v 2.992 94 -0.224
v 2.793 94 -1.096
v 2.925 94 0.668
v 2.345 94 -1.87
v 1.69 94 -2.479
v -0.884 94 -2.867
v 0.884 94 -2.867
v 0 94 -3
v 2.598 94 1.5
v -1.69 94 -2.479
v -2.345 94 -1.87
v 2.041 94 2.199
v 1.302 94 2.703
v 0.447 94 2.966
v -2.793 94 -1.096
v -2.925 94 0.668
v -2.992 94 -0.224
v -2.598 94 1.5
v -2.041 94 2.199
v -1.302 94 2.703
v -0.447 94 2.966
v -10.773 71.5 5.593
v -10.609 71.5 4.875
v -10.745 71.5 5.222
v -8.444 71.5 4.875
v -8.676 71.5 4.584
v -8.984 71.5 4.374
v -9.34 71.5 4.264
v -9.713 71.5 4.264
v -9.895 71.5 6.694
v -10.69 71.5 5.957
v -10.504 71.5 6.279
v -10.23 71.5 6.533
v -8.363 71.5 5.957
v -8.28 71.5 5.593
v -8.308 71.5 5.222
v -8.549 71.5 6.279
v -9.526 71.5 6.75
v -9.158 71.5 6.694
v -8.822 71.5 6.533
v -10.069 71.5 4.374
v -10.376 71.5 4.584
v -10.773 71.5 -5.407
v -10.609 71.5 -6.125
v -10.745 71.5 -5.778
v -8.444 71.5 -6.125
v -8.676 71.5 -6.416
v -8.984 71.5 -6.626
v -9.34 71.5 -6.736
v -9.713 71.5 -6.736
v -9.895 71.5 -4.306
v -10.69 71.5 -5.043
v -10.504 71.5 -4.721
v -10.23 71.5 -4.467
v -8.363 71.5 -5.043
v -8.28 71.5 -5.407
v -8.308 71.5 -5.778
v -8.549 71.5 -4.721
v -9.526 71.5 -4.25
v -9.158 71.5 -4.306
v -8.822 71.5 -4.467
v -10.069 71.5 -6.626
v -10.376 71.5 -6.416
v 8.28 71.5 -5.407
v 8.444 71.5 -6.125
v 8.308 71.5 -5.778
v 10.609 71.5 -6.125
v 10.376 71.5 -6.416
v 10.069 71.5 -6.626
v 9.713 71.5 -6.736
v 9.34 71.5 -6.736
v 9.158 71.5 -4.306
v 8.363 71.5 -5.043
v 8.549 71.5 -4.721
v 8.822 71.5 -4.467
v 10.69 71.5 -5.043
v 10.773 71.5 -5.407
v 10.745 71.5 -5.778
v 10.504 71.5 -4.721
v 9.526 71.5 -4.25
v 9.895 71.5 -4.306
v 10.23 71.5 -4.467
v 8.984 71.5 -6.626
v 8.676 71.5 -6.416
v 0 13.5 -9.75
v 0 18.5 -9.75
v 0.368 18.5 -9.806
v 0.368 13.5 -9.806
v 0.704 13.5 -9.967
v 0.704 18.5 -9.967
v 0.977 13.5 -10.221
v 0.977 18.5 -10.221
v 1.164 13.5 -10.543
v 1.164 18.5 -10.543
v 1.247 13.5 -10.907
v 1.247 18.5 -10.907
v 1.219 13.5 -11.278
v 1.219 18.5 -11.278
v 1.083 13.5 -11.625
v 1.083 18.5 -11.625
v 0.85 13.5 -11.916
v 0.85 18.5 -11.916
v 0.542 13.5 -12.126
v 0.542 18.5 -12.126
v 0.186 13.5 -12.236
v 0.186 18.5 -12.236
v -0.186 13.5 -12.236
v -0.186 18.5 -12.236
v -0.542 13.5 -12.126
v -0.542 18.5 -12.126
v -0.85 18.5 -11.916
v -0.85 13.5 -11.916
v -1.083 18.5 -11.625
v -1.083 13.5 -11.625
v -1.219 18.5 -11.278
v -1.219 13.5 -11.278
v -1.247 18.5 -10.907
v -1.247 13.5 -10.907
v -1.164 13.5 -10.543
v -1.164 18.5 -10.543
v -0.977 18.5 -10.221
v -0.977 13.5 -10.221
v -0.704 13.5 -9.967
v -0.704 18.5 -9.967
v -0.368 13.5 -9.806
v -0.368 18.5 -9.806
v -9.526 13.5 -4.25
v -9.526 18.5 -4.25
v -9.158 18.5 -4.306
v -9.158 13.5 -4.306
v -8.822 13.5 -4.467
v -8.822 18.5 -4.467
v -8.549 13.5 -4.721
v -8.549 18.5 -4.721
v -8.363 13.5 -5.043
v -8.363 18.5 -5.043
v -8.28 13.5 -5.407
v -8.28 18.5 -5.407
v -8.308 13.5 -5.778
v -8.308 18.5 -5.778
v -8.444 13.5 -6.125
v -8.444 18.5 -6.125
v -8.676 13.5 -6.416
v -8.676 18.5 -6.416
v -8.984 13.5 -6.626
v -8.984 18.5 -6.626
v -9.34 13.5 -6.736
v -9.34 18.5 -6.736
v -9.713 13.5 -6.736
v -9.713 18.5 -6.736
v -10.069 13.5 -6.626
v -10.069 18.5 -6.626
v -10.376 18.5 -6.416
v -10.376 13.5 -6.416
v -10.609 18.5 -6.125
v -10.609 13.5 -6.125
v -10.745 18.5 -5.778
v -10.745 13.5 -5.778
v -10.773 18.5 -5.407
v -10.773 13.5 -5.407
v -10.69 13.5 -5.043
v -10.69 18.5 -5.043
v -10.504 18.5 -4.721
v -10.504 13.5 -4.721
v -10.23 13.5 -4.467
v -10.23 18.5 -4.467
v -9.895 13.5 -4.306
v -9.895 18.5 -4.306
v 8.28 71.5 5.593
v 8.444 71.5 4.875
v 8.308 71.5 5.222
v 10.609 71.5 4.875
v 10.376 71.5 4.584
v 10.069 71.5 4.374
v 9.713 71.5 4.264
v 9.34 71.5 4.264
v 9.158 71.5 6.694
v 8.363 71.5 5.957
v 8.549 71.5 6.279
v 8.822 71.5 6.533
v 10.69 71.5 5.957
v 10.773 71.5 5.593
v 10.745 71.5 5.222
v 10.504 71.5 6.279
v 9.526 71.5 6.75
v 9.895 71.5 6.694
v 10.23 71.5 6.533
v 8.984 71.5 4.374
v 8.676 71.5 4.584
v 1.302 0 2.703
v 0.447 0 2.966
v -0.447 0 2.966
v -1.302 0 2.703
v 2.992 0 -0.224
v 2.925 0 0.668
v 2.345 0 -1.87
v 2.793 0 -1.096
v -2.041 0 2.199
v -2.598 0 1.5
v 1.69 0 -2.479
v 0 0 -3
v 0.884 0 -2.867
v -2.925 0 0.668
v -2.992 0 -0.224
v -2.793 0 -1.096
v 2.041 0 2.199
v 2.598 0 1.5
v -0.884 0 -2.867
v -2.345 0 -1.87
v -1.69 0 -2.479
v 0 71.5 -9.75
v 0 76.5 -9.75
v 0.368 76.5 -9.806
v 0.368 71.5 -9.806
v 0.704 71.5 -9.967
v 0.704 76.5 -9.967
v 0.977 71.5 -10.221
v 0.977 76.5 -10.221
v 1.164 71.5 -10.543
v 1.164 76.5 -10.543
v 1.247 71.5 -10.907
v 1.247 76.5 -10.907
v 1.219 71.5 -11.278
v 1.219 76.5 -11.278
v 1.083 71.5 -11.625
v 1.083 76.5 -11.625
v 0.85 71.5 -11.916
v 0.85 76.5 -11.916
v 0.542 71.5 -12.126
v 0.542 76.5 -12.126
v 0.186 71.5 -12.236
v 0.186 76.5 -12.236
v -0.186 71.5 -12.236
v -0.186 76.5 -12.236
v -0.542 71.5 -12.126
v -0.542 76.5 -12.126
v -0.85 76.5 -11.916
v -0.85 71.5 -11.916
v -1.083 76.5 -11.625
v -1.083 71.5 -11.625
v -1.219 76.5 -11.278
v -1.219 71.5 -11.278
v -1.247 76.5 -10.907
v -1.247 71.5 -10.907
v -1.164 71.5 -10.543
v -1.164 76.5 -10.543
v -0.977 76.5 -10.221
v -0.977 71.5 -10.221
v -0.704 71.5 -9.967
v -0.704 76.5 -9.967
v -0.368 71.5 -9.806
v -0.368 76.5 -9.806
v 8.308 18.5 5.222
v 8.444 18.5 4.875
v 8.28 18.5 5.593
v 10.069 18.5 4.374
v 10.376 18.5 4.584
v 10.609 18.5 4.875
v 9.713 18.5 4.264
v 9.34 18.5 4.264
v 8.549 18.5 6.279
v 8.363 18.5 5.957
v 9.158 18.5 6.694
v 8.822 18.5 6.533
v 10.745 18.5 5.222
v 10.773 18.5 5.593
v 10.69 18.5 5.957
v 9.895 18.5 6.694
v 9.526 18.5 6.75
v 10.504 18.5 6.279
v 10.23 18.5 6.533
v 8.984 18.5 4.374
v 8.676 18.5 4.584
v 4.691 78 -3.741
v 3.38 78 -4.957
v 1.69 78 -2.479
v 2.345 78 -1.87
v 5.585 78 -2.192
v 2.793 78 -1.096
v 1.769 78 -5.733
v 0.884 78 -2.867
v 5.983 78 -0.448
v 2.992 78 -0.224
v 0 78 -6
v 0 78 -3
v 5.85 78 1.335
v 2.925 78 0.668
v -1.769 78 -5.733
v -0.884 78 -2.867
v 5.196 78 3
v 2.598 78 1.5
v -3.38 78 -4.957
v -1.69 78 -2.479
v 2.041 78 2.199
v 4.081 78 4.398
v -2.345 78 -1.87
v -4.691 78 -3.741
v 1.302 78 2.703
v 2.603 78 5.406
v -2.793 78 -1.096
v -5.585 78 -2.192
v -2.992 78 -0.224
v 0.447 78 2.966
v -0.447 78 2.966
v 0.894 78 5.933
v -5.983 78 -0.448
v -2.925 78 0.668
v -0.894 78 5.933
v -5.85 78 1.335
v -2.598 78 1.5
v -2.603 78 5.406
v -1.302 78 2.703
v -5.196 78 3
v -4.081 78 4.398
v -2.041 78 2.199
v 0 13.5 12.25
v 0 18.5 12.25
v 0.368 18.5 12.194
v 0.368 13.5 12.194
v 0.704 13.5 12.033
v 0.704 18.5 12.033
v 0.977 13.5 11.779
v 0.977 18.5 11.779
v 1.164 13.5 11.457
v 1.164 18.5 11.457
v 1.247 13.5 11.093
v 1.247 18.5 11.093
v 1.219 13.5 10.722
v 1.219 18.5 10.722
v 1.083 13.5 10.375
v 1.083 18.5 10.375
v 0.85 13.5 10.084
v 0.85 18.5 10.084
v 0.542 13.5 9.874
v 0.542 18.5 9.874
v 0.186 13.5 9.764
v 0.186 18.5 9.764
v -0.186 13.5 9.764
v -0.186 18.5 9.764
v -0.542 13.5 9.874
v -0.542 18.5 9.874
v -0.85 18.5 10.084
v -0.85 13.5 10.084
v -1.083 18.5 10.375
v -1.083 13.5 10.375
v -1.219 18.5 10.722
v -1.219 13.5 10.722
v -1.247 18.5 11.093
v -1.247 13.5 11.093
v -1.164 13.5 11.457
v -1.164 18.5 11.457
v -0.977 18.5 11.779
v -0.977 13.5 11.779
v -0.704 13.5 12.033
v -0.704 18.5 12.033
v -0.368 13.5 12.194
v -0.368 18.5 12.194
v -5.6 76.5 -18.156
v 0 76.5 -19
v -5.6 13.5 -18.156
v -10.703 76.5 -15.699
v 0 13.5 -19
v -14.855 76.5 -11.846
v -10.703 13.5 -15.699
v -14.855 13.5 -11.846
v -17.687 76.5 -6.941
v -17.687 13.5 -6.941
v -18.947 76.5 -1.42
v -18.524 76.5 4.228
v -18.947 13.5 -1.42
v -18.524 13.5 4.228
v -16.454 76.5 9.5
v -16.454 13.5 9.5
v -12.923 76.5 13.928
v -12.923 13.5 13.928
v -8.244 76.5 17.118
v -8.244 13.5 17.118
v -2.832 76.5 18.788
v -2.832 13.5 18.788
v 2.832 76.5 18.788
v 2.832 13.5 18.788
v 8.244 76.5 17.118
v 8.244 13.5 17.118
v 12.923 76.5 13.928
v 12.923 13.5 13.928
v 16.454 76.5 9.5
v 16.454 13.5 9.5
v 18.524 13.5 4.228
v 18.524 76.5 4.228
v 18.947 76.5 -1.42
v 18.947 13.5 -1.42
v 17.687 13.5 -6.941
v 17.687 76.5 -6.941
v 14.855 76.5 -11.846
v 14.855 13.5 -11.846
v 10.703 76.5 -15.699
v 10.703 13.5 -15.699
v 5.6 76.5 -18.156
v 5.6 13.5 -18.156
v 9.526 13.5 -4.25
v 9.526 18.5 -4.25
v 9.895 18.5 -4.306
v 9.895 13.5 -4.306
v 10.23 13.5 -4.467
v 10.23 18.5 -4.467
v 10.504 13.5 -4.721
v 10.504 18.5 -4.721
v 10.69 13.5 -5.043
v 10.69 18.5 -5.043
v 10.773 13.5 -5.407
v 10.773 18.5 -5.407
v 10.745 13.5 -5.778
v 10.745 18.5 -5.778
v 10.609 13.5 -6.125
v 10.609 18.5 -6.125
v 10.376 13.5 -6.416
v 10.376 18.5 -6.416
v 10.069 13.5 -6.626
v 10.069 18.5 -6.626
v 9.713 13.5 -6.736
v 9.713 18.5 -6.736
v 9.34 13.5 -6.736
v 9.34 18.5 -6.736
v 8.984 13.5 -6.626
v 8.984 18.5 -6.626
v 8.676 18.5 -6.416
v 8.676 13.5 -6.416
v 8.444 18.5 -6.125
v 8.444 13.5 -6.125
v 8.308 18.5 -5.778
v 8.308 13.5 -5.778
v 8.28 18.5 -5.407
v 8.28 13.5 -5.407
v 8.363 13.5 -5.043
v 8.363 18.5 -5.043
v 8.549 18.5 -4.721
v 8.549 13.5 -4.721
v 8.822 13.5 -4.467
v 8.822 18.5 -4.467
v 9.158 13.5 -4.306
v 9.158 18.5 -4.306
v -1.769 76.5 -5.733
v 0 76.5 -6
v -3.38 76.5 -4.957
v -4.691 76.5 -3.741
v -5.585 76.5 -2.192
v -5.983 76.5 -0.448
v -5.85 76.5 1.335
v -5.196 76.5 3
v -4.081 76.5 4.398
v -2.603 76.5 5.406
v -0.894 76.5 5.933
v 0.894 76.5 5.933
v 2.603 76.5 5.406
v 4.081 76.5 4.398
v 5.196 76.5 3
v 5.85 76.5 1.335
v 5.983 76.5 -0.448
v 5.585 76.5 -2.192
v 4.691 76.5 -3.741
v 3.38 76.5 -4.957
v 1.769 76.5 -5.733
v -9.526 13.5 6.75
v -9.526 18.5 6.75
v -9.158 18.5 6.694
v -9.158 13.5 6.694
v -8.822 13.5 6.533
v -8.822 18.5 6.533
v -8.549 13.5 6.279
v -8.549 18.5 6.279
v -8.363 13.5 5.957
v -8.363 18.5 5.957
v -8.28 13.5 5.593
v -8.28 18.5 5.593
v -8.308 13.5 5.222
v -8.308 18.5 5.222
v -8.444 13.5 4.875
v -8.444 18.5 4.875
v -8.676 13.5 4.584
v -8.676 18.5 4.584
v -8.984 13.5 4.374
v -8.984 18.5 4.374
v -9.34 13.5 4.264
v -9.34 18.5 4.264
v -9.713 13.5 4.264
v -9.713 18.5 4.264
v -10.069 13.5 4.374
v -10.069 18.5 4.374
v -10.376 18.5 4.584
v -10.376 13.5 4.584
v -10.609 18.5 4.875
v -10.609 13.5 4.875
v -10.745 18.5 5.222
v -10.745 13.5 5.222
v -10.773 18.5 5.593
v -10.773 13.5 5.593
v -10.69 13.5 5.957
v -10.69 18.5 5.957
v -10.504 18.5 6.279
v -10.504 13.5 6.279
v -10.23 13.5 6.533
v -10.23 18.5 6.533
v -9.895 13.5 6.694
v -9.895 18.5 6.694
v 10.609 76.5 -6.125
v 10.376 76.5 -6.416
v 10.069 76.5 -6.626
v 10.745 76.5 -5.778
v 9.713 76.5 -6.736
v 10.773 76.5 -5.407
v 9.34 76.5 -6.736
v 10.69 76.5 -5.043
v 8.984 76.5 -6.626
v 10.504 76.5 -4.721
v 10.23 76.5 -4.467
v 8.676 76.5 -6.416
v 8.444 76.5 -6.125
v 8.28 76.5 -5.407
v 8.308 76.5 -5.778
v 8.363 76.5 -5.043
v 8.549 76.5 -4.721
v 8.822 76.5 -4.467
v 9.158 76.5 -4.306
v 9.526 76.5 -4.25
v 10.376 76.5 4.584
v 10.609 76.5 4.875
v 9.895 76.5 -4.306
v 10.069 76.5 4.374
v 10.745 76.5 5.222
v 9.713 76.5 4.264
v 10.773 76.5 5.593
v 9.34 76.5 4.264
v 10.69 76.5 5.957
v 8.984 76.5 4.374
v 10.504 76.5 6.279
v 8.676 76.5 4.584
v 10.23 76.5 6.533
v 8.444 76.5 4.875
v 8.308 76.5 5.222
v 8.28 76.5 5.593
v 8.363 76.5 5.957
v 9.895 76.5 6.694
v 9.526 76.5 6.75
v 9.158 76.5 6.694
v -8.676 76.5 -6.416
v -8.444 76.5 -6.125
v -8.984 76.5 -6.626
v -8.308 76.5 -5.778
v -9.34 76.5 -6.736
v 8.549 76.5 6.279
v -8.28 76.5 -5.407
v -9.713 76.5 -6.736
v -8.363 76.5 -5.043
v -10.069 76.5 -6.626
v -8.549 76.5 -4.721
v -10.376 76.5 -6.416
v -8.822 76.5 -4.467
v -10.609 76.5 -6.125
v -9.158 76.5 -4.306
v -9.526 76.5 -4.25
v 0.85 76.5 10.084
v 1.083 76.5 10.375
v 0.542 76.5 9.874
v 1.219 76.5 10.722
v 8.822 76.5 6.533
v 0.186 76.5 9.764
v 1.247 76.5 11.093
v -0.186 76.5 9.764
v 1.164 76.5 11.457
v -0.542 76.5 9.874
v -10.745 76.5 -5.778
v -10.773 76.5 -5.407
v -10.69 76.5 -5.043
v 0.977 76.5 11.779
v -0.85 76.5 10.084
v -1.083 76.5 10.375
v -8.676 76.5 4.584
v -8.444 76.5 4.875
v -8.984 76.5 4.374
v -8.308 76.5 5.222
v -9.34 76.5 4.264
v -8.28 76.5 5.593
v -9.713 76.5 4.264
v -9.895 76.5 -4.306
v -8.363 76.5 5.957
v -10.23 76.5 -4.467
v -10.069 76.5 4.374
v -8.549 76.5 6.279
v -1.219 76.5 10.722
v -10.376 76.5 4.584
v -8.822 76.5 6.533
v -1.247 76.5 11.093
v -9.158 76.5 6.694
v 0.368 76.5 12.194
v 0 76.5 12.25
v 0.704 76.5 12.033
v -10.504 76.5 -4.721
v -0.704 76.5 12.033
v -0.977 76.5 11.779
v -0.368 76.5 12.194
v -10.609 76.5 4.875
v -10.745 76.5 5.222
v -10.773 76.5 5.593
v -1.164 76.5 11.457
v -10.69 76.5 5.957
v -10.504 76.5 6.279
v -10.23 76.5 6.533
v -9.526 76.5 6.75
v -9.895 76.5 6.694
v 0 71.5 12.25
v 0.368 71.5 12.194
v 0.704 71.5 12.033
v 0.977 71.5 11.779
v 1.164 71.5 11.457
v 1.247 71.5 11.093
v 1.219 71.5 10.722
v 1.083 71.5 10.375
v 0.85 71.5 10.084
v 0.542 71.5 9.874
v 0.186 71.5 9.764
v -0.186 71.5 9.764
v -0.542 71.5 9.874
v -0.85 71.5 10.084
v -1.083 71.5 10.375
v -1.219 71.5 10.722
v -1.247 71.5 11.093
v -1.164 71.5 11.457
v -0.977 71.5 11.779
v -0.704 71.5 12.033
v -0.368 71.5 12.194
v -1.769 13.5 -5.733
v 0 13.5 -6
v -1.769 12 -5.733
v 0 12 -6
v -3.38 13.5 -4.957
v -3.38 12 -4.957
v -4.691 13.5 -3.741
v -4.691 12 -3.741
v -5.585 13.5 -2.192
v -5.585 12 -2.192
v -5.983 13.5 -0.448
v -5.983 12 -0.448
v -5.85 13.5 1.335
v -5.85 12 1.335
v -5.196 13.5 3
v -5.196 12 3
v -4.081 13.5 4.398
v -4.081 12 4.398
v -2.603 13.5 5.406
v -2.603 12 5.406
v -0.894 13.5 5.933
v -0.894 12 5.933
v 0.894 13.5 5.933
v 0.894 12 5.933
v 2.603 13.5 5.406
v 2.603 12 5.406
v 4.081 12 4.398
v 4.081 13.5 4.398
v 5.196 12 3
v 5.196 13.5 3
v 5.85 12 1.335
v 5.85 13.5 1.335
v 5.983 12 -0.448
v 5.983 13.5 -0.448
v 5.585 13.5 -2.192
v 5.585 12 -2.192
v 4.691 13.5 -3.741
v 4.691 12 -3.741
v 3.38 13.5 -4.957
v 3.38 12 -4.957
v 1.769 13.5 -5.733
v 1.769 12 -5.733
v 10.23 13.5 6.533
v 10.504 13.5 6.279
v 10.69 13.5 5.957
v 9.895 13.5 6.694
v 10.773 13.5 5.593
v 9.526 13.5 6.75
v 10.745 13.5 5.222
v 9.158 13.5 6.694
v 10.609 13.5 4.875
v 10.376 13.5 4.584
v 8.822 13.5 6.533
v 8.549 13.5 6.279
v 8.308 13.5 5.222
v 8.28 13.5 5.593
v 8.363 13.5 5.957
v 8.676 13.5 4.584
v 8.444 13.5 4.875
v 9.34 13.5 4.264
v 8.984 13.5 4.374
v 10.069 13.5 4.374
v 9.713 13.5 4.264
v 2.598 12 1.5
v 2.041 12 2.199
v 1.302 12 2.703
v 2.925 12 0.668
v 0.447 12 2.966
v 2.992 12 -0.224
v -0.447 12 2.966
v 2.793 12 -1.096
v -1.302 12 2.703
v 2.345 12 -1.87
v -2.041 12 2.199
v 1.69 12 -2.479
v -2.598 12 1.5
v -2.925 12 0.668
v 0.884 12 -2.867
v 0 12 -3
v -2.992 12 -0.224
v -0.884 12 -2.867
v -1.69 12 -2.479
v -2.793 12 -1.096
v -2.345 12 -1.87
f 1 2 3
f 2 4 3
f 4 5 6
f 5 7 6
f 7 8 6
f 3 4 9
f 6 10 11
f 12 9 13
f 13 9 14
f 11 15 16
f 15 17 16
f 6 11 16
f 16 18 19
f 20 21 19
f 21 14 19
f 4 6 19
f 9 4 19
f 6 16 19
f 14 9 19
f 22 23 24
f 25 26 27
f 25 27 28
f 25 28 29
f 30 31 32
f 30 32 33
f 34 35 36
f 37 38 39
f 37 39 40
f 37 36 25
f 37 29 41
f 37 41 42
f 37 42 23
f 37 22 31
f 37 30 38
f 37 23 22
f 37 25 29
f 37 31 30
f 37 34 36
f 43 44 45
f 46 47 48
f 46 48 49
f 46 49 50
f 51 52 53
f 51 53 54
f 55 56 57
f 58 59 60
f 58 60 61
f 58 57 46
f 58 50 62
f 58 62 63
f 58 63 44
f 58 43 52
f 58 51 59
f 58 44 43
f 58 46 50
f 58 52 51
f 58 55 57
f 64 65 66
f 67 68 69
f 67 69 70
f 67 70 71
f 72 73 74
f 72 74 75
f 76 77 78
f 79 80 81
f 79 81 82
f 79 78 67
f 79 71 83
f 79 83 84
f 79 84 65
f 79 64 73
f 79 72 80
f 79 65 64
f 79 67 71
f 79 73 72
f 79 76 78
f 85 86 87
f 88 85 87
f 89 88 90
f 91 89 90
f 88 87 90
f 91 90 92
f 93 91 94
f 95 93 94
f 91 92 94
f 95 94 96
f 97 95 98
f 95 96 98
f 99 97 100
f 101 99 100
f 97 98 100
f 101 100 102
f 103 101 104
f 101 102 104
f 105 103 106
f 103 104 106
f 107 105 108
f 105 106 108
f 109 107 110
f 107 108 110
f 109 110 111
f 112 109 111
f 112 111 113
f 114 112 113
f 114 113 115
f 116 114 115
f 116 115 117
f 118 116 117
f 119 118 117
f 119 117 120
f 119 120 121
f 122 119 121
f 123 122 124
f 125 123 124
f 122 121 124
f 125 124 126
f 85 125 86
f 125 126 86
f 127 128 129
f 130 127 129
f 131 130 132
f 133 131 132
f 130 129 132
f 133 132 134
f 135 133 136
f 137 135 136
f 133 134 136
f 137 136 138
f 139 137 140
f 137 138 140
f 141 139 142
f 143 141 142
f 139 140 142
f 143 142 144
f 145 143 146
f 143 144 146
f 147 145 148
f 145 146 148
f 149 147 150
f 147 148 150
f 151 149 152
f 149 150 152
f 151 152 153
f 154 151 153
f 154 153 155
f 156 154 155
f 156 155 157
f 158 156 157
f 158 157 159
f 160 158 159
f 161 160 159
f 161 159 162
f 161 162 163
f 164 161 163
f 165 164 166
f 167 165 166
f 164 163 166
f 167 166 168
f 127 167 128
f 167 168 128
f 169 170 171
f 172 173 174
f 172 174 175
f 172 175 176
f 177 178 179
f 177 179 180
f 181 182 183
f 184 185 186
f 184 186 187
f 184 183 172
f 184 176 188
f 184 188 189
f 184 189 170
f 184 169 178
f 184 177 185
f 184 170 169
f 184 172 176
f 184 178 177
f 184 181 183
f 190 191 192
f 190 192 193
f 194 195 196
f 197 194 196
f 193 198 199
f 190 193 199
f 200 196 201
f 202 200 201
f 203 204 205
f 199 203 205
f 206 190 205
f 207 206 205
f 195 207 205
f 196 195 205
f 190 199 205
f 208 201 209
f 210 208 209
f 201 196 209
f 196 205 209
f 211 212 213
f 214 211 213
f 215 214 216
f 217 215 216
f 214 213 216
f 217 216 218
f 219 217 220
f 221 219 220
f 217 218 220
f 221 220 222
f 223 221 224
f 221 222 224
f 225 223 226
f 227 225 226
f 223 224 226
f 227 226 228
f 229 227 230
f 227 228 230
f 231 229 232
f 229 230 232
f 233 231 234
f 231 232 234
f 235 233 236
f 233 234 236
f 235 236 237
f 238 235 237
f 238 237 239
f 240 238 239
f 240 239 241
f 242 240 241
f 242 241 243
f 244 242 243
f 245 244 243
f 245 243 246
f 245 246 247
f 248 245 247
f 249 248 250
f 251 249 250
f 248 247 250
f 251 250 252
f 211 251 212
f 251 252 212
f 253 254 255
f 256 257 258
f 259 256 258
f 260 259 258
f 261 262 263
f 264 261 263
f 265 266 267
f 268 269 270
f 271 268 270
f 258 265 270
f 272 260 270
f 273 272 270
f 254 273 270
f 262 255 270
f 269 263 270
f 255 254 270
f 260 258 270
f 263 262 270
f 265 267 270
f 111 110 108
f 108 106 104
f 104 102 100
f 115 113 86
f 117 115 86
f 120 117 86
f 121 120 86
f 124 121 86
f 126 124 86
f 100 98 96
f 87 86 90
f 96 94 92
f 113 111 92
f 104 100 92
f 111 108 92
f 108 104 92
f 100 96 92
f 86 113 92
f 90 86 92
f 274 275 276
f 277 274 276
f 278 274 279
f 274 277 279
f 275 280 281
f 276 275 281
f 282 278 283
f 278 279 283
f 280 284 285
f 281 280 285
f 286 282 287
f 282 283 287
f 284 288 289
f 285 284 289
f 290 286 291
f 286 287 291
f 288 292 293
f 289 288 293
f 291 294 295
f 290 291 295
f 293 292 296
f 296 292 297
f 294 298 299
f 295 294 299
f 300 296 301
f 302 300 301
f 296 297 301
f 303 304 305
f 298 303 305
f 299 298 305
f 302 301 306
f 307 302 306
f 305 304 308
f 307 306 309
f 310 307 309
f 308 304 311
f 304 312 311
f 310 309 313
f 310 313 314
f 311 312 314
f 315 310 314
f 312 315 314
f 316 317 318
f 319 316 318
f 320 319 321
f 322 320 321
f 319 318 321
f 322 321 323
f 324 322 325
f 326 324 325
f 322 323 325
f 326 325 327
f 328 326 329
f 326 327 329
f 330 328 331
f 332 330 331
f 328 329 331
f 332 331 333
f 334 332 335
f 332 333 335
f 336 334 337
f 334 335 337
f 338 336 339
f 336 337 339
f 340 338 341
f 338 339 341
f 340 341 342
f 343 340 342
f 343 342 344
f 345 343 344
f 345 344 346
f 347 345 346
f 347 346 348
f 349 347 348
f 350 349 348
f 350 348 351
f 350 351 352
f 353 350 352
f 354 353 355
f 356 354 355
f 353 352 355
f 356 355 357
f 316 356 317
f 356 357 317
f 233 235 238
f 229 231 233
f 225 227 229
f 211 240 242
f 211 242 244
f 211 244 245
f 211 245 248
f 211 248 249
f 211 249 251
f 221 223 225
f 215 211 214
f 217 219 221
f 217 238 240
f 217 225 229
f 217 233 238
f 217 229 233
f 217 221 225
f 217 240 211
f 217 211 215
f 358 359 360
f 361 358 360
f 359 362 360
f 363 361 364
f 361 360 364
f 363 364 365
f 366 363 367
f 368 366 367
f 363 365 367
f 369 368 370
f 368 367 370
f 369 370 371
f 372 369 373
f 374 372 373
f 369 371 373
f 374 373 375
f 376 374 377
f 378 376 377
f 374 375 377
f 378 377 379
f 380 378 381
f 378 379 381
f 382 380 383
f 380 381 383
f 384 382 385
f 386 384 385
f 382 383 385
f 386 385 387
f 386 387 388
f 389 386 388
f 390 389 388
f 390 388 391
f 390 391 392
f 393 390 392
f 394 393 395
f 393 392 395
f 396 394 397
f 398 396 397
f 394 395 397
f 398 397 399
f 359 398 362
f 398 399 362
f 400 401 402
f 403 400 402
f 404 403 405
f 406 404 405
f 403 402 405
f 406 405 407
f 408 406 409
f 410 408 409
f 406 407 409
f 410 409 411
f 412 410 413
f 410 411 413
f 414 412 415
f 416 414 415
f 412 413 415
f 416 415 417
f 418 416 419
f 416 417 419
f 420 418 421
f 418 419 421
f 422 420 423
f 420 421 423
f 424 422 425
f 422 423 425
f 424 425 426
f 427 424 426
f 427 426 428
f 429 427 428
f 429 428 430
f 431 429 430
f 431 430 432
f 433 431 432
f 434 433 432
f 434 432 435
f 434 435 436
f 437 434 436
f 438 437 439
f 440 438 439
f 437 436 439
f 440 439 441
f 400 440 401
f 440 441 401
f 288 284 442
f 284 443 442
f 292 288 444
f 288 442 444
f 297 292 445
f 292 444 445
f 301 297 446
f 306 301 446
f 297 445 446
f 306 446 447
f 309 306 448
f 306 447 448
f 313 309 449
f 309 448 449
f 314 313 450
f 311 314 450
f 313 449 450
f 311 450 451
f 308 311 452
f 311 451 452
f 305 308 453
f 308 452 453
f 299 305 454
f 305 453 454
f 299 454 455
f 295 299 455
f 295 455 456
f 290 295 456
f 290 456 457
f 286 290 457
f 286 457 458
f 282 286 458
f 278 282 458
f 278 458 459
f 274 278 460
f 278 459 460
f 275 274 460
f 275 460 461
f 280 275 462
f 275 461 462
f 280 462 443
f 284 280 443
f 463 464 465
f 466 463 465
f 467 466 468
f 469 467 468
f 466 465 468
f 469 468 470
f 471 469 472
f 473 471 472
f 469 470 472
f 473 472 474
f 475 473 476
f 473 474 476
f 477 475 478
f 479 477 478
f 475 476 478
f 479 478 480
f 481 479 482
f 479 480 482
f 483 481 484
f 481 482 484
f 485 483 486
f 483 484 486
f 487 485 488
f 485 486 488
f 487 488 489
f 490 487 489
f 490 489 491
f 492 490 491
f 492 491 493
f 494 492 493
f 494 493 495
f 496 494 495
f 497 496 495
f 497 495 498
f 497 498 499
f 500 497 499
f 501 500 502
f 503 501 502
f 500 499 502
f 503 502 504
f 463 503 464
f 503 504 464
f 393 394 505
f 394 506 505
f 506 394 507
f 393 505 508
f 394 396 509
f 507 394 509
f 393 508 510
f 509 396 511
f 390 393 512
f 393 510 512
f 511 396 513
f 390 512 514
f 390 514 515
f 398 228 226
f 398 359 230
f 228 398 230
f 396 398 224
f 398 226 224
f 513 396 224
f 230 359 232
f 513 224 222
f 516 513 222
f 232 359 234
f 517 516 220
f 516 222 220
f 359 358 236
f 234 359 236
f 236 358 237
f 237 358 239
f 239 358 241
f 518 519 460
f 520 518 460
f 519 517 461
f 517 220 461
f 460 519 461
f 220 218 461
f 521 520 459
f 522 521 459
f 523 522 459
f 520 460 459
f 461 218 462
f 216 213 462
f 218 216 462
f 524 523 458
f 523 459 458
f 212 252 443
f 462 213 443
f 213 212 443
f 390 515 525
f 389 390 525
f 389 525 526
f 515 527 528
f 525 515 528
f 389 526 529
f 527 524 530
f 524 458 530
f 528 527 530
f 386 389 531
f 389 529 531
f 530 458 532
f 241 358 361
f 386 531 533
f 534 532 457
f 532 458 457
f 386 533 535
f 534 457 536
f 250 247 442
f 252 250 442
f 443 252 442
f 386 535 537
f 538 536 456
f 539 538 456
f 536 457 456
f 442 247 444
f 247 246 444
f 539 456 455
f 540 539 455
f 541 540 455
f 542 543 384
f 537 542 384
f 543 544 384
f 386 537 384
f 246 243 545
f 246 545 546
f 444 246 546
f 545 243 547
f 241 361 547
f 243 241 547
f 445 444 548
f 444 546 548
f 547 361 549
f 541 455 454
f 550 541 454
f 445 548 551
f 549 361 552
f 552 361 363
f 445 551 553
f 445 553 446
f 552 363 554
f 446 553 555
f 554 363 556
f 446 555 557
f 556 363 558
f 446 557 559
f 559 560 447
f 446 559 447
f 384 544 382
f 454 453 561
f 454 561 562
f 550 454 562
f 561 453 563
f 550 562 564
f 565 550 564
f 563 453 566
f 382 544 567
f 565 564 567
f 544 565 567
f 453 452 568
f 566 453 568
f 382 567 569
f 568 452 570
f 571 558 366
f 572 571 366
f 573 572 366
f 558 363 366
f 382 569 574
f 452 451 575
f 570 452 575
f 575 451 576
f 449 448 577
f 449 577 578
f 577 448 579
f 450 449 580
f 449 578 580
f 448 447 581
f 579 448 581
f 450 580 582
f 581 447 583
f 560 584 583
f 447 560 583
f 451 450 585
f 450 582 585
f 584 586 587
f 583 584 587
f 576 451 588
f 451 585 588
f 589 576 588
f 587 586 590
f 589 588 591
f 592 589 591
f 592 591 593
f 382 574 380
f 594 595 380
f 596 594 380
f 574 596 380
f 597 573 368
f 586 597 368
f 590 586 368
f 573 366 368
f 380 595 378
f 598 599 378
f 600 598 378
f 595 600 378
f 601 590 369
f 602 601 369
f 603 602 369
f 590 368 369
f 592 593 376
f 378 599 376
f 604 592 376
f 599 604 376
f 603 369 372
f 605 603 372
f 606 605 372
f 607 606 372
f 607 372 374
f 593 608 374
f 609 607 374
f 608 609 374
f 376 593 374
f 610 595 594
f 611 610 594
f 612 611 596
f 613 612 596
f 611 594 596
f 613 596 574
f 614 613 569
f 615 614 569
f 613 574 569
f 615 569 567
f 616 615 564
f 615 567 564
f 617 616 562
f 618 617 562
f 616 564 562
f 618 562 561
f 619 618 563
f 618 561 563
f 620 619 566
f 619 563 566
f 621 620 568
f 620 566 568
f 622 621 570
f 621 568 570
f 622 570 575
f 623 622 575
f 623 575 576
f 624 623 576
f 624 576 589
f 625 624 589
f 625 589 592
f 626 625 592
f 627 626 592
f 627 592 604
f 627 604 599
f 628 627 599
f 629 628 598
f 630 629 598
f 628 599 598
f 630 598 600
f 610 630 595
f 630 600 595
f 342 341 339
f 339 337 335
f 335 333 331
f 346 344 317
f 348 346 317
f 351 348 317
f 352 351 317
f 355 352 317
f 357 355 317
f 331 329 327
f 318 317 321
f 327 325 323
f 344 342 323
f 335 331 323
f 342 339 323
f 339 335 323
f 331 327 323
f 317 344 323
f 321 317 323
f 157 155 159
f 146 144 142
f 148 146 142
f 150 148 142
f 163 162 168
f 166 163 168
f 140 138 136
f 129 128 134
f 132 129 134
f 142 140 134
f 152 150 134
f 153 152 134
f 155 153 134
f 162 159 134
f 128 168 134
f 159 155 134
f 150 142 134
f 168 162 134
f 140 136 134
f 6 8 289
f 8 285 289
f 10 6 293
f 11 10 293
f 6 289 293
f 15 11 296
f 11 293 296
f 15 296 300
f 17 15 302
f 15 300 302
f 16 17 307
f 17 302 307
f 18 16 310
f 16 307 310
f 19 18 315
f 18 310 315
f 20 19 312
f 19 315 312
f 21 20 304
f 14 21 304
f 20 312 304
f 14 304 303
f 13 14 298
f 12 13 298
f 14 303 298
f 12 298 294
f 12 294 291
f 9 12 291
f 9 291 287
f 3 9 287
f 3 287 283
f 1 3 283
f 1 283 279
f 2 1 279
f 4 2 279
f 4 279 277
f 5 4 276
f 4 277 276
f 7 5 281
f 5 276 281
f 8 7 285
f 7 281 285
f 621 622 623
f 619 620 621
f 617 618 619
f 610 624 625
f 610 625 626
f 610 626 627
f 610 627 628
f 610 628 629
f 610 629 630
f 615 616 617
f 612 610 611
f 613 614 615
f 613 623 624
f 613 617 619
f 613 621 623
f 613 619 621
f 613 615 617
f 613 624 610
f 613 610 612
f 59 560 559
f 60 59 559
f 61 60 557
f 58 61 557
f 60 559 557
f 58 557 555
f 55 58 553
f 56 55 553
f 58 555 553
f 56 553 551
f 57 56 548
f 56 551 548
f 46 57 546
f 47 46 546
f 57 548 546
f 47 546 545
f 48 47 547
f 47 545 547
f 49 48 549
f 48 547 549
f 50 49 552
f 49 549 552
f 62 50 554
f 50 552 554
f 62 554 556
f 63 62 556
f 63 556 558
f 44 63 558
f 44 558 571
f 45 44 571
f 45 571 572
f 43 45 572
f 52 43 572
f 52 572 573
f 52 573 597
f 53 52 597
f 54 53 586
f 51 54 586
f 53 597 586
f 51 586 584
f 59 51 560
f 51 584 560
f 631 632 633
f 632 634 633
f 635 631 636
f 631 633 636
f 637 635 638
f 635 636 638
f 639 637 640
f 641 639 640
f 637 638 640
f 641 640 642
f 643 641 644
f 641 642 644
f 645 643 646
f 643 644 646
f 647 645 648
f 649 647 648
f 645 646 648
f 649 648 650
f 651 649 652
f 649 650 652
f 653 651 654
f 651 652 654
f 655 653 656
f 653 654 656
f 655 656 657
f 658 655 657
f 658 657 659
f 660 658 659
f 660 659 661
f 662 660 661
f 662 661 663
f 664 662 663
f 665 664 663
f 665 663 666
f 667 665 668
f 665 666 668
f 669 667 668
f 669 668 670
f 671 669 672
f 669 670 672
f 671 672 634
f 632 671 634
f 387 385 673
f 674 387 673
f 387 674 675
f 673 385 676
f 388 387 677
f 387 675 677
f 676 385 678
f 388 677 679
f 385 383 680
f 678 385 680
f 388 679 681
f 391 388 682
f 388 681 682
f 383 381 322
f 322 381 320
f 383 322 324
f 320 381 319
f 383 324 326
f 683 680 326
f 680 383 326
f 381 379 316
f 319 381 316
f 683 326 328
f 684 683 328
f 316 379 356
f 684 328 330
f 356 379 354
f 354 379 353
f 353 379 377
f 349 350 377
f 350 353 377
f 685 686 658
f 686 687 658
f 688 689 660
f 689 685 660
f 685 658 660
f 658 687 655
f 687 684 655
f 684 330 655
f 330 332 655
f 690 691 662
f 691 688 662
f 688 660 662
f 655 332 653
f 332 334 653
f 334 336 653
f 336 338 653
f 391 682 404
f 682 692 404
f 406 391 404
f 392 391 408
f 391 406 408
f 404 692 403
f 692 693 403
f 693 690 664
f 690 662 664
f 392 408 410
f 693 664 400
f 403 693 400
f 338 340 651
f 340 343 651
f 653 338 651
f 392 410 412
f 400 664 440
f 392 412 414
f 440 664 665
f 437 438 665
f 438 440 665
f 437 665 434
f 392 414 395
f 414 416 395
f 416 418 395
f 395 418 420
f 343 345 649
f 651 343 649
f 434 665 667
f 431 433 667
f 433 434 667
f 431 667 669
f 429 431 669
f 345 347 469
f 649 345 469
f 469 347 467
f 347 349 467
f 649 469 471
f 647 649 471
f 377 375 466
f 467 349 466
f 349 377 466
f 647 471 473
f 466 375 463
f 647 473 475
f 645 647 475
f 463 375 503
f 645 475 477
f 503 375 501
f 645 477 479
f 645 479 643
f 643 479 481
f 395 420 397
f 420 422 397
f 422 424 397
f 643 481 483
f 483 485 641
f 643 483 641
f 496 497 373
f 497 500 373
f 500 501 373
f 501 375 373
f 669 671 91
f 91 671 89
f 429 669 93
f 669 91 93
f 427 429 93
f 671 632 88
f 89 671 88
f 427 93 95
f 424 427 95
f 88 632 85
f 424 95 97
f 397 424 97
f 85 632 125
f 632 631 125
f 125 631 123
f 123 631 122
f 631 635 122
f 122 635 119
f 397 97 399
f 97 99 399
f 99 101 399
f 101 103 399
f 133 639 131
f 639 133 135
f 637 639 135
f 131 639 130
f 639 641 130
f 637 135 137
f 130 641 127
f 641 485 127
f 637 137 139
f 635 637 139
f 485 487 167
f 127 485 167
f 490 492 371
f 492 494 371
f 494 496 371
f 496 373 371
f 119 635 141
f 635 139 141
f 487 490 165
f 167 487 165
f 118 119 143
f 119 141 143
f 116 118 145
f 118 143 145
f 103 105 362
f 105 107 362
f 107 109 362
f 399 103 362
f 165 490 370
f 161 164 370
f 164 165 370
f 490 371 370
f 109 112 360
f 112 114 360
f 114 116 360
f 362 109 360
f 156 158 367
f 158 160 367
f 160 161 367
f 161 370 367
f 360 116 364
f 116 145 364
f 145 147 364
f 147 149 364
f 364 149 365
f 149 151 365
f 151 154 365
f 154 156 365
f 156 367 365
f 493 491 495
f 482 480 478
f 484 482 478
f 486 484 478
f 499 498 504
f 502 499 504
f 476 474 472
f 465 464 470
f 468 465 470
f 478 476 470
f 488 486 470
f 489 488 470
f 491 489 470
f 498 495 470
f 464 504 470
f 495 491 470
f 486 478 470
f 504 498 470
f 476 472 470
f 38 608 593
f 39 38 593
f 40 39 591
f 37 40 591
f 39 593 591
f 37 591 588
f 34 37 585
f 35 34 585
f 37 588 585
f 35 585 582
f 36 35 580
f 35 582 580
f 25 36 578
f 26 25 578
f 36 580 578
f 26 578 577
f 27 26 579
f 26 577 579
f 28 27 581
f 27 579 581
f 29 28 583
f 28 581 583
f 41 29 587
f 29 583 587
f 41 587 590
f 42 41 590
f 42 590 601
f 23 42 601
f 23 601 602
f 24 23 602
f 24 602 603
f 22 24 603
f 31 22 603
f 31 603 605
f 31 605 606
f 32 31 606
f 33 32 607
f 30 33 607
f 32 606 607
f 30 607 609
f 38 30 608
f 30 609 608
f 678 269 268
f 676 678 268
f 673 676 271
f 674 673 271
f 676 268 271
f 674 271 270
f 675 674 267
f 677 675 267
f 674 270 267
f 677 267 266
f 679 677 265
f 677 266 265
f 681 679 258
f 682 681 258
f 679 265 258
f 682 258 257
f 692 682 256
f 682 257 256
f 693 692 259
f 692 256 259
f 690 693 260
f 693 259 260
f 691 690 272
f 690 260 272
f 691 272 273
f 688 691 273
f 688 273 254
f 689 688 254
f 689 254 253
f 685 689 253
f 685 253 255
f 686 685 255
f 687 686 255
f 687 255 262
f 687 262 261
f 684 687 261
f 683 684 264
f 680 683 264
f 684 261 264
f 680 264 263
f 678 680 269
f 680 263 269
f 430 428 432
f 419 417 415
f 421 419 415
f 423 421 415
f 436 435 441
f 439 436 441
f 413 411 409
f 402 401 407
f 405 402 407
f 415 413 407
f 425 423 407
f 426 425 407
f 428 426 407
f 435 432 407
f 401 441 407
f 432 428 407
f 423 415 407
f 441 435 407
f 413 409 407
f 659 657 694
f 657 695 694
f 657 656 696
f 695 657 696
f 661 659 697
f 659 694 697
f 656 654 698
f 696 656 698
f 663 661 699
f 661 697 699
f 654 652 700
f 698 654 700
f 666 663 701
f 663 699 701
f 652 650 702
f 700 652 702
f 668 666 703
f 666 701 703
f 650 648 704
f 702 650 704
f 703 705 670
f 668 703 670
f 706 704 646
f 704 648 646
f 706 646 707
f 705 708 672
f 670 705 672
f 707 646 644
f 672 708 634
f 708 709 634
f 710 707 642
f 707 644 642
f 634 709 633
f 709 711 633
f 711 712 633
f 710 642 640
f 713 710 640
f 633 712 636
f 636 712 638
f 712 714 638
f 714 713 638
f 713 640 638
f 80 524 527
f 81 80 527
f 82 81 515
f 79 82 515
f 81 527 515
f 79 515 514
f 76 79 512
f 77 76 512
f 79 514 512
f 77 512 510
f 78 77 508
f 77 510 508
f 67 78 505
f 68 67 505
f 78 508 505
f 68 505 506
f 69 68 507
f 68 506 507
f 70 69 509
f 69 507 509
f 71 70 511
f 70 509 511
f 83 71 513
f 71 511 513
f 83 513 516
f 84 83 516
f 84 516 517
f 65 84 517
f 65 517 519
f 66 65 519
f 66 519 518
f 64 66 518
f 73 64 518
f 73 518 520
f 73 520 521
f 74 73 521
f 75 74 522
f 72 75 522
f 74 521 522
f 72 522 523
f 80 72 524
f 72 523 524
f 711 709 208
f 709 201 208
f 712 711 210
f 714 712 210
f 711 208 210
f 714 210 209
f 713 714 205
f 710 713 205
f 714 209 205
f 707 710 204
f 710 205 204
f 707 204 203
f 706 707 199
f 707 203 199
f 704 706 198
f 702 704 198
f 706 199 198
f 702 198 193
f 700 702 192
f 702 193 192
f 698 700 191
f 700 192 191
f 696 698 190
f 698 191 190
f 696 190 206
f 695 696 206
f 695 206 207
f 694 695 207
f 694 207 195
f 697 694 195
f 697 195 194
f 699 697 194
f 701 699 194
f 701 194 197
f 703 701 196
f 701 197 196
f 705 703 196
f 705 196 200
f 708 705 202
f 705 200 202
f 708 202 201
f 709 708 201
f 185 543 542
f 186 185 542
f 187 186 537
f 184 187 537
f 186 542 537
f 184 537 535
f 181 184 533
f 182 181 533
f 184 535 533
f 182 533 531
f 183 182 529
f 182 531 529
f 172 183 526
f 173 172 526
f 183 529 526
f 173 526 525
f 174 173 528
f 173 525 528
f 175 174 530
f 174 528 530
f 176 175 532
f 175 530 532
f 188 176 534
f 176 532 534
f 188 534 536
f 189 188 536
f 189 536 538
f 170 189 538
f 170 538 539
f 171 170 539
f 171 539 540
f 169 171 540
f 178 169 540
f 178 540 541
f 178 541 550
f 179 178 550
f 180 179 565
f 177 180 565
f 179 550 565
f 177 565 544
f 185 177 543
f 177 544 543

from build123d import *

# Parameters (mm, degrees)
ESQUISSE2_R             = 1.25
ENL_V_MAT_EXTRU_1_DEPTH = 5
ENL_V_START             = -58
ESQUISSE2_2_R           = 1.25
ENL_V_MAT_EXTRU_2_DEPTH = 5


with BuildPart() as part:
    # Esquisse1 → Révolution1 (revolve)
    with BuildSketch(Plane.XY, mode=Mode.PRIVATE) as r_volution1_sk:
        Polygon((0, 0), (0, 94), (3, 94), (3, 78), (6, 78), (6, 76.5), (19, 76.5), (19, 13.5), (6, 13.5), (6, 12), (3, 12), (3, 0), align=None)
    revolve(r_volution1_sk.sketch.rotate(Axis((0, 0, 0), (0, 1, 0)), 90), axis=Axis((0, 0, 0), (0, 1, 0)))

    # Esquisse2 → Enlèv. mat.-Extru.1 (cut)
    with BuildSketch(Plane(origin=(0, 76.5, 0), x_dir=(1, 0, 0), z_dir=(0, 1, 0))):
        with Locations(Location((0, 11, 0), (0, 0, 270))):
            Circle(ESQUISSE2_R)
        with Locations(Location((9.526279442, 5.5, 0), (0, 0, 270))):
            Circle(ESQUISSE2_R)
        with Locations(Location((9.526279442, -5.5, 0), (0, 0, 270))):
            Circle(ESQUISSE2_R)
        with Locations(Location((0, -11, 0), (0, 0, 270))):
            Circle(ESQUISSE2_R)
        with Locations(Location((-9.526279442, -5.5, 0), (0, 0, 270))):
            Circle(ESQUISSE2_R)
        with Locations(Location((-9.526279442, 5.5, 0), (0, 0, 270))):
            Circle(ESQUISSE2_R)
    extrude(amount=-ENL_V_MAT_EXTRU_1_DEPTH, mode=Mode.SUBTRACT)

    # Esquisse2<2> → Enlèv. mat.-Extru.2 (cut)
    with BuildSketch(Plane(origin=(0, 76.5, 0), x_dir=(1, 0, 0), z_dir=(0, 1, 0)).offset(ENL_V_START)):
        with Locations(Location((0, 11, 0), (0, 0, 270))):
            Circle(ESQUISSE2_2_R)
        with Locations(Location((9.526279442, 5.5, 0), (0, 0, 270))):
            Circle(ESQUISSE2_2_R)
        with Locations(Location((9.526279442, -5.5, 0), (0, 0, 270))):
            Circle(ESQUISSE2_2_R)
        with Locations(Location((0, -11, 0), (0, 0, 270))):
            Circle(ESQUISSE2_2_R)
        with Locations(Location((-9.526279442, -5.5, 0), (0, 0, 270))):
            Circle(ESQUISSE2_2_R)
        with Locations(Location((-9.526279442, 5.5, 0), (0, 0, 270))):
            Circle(ESQUISSE2_2_R)
    extrude(amount=-ENL_V_MAT_EXTRU_2_DEPTH, mode=Mode.SUBTRACT)


solid = part.part
